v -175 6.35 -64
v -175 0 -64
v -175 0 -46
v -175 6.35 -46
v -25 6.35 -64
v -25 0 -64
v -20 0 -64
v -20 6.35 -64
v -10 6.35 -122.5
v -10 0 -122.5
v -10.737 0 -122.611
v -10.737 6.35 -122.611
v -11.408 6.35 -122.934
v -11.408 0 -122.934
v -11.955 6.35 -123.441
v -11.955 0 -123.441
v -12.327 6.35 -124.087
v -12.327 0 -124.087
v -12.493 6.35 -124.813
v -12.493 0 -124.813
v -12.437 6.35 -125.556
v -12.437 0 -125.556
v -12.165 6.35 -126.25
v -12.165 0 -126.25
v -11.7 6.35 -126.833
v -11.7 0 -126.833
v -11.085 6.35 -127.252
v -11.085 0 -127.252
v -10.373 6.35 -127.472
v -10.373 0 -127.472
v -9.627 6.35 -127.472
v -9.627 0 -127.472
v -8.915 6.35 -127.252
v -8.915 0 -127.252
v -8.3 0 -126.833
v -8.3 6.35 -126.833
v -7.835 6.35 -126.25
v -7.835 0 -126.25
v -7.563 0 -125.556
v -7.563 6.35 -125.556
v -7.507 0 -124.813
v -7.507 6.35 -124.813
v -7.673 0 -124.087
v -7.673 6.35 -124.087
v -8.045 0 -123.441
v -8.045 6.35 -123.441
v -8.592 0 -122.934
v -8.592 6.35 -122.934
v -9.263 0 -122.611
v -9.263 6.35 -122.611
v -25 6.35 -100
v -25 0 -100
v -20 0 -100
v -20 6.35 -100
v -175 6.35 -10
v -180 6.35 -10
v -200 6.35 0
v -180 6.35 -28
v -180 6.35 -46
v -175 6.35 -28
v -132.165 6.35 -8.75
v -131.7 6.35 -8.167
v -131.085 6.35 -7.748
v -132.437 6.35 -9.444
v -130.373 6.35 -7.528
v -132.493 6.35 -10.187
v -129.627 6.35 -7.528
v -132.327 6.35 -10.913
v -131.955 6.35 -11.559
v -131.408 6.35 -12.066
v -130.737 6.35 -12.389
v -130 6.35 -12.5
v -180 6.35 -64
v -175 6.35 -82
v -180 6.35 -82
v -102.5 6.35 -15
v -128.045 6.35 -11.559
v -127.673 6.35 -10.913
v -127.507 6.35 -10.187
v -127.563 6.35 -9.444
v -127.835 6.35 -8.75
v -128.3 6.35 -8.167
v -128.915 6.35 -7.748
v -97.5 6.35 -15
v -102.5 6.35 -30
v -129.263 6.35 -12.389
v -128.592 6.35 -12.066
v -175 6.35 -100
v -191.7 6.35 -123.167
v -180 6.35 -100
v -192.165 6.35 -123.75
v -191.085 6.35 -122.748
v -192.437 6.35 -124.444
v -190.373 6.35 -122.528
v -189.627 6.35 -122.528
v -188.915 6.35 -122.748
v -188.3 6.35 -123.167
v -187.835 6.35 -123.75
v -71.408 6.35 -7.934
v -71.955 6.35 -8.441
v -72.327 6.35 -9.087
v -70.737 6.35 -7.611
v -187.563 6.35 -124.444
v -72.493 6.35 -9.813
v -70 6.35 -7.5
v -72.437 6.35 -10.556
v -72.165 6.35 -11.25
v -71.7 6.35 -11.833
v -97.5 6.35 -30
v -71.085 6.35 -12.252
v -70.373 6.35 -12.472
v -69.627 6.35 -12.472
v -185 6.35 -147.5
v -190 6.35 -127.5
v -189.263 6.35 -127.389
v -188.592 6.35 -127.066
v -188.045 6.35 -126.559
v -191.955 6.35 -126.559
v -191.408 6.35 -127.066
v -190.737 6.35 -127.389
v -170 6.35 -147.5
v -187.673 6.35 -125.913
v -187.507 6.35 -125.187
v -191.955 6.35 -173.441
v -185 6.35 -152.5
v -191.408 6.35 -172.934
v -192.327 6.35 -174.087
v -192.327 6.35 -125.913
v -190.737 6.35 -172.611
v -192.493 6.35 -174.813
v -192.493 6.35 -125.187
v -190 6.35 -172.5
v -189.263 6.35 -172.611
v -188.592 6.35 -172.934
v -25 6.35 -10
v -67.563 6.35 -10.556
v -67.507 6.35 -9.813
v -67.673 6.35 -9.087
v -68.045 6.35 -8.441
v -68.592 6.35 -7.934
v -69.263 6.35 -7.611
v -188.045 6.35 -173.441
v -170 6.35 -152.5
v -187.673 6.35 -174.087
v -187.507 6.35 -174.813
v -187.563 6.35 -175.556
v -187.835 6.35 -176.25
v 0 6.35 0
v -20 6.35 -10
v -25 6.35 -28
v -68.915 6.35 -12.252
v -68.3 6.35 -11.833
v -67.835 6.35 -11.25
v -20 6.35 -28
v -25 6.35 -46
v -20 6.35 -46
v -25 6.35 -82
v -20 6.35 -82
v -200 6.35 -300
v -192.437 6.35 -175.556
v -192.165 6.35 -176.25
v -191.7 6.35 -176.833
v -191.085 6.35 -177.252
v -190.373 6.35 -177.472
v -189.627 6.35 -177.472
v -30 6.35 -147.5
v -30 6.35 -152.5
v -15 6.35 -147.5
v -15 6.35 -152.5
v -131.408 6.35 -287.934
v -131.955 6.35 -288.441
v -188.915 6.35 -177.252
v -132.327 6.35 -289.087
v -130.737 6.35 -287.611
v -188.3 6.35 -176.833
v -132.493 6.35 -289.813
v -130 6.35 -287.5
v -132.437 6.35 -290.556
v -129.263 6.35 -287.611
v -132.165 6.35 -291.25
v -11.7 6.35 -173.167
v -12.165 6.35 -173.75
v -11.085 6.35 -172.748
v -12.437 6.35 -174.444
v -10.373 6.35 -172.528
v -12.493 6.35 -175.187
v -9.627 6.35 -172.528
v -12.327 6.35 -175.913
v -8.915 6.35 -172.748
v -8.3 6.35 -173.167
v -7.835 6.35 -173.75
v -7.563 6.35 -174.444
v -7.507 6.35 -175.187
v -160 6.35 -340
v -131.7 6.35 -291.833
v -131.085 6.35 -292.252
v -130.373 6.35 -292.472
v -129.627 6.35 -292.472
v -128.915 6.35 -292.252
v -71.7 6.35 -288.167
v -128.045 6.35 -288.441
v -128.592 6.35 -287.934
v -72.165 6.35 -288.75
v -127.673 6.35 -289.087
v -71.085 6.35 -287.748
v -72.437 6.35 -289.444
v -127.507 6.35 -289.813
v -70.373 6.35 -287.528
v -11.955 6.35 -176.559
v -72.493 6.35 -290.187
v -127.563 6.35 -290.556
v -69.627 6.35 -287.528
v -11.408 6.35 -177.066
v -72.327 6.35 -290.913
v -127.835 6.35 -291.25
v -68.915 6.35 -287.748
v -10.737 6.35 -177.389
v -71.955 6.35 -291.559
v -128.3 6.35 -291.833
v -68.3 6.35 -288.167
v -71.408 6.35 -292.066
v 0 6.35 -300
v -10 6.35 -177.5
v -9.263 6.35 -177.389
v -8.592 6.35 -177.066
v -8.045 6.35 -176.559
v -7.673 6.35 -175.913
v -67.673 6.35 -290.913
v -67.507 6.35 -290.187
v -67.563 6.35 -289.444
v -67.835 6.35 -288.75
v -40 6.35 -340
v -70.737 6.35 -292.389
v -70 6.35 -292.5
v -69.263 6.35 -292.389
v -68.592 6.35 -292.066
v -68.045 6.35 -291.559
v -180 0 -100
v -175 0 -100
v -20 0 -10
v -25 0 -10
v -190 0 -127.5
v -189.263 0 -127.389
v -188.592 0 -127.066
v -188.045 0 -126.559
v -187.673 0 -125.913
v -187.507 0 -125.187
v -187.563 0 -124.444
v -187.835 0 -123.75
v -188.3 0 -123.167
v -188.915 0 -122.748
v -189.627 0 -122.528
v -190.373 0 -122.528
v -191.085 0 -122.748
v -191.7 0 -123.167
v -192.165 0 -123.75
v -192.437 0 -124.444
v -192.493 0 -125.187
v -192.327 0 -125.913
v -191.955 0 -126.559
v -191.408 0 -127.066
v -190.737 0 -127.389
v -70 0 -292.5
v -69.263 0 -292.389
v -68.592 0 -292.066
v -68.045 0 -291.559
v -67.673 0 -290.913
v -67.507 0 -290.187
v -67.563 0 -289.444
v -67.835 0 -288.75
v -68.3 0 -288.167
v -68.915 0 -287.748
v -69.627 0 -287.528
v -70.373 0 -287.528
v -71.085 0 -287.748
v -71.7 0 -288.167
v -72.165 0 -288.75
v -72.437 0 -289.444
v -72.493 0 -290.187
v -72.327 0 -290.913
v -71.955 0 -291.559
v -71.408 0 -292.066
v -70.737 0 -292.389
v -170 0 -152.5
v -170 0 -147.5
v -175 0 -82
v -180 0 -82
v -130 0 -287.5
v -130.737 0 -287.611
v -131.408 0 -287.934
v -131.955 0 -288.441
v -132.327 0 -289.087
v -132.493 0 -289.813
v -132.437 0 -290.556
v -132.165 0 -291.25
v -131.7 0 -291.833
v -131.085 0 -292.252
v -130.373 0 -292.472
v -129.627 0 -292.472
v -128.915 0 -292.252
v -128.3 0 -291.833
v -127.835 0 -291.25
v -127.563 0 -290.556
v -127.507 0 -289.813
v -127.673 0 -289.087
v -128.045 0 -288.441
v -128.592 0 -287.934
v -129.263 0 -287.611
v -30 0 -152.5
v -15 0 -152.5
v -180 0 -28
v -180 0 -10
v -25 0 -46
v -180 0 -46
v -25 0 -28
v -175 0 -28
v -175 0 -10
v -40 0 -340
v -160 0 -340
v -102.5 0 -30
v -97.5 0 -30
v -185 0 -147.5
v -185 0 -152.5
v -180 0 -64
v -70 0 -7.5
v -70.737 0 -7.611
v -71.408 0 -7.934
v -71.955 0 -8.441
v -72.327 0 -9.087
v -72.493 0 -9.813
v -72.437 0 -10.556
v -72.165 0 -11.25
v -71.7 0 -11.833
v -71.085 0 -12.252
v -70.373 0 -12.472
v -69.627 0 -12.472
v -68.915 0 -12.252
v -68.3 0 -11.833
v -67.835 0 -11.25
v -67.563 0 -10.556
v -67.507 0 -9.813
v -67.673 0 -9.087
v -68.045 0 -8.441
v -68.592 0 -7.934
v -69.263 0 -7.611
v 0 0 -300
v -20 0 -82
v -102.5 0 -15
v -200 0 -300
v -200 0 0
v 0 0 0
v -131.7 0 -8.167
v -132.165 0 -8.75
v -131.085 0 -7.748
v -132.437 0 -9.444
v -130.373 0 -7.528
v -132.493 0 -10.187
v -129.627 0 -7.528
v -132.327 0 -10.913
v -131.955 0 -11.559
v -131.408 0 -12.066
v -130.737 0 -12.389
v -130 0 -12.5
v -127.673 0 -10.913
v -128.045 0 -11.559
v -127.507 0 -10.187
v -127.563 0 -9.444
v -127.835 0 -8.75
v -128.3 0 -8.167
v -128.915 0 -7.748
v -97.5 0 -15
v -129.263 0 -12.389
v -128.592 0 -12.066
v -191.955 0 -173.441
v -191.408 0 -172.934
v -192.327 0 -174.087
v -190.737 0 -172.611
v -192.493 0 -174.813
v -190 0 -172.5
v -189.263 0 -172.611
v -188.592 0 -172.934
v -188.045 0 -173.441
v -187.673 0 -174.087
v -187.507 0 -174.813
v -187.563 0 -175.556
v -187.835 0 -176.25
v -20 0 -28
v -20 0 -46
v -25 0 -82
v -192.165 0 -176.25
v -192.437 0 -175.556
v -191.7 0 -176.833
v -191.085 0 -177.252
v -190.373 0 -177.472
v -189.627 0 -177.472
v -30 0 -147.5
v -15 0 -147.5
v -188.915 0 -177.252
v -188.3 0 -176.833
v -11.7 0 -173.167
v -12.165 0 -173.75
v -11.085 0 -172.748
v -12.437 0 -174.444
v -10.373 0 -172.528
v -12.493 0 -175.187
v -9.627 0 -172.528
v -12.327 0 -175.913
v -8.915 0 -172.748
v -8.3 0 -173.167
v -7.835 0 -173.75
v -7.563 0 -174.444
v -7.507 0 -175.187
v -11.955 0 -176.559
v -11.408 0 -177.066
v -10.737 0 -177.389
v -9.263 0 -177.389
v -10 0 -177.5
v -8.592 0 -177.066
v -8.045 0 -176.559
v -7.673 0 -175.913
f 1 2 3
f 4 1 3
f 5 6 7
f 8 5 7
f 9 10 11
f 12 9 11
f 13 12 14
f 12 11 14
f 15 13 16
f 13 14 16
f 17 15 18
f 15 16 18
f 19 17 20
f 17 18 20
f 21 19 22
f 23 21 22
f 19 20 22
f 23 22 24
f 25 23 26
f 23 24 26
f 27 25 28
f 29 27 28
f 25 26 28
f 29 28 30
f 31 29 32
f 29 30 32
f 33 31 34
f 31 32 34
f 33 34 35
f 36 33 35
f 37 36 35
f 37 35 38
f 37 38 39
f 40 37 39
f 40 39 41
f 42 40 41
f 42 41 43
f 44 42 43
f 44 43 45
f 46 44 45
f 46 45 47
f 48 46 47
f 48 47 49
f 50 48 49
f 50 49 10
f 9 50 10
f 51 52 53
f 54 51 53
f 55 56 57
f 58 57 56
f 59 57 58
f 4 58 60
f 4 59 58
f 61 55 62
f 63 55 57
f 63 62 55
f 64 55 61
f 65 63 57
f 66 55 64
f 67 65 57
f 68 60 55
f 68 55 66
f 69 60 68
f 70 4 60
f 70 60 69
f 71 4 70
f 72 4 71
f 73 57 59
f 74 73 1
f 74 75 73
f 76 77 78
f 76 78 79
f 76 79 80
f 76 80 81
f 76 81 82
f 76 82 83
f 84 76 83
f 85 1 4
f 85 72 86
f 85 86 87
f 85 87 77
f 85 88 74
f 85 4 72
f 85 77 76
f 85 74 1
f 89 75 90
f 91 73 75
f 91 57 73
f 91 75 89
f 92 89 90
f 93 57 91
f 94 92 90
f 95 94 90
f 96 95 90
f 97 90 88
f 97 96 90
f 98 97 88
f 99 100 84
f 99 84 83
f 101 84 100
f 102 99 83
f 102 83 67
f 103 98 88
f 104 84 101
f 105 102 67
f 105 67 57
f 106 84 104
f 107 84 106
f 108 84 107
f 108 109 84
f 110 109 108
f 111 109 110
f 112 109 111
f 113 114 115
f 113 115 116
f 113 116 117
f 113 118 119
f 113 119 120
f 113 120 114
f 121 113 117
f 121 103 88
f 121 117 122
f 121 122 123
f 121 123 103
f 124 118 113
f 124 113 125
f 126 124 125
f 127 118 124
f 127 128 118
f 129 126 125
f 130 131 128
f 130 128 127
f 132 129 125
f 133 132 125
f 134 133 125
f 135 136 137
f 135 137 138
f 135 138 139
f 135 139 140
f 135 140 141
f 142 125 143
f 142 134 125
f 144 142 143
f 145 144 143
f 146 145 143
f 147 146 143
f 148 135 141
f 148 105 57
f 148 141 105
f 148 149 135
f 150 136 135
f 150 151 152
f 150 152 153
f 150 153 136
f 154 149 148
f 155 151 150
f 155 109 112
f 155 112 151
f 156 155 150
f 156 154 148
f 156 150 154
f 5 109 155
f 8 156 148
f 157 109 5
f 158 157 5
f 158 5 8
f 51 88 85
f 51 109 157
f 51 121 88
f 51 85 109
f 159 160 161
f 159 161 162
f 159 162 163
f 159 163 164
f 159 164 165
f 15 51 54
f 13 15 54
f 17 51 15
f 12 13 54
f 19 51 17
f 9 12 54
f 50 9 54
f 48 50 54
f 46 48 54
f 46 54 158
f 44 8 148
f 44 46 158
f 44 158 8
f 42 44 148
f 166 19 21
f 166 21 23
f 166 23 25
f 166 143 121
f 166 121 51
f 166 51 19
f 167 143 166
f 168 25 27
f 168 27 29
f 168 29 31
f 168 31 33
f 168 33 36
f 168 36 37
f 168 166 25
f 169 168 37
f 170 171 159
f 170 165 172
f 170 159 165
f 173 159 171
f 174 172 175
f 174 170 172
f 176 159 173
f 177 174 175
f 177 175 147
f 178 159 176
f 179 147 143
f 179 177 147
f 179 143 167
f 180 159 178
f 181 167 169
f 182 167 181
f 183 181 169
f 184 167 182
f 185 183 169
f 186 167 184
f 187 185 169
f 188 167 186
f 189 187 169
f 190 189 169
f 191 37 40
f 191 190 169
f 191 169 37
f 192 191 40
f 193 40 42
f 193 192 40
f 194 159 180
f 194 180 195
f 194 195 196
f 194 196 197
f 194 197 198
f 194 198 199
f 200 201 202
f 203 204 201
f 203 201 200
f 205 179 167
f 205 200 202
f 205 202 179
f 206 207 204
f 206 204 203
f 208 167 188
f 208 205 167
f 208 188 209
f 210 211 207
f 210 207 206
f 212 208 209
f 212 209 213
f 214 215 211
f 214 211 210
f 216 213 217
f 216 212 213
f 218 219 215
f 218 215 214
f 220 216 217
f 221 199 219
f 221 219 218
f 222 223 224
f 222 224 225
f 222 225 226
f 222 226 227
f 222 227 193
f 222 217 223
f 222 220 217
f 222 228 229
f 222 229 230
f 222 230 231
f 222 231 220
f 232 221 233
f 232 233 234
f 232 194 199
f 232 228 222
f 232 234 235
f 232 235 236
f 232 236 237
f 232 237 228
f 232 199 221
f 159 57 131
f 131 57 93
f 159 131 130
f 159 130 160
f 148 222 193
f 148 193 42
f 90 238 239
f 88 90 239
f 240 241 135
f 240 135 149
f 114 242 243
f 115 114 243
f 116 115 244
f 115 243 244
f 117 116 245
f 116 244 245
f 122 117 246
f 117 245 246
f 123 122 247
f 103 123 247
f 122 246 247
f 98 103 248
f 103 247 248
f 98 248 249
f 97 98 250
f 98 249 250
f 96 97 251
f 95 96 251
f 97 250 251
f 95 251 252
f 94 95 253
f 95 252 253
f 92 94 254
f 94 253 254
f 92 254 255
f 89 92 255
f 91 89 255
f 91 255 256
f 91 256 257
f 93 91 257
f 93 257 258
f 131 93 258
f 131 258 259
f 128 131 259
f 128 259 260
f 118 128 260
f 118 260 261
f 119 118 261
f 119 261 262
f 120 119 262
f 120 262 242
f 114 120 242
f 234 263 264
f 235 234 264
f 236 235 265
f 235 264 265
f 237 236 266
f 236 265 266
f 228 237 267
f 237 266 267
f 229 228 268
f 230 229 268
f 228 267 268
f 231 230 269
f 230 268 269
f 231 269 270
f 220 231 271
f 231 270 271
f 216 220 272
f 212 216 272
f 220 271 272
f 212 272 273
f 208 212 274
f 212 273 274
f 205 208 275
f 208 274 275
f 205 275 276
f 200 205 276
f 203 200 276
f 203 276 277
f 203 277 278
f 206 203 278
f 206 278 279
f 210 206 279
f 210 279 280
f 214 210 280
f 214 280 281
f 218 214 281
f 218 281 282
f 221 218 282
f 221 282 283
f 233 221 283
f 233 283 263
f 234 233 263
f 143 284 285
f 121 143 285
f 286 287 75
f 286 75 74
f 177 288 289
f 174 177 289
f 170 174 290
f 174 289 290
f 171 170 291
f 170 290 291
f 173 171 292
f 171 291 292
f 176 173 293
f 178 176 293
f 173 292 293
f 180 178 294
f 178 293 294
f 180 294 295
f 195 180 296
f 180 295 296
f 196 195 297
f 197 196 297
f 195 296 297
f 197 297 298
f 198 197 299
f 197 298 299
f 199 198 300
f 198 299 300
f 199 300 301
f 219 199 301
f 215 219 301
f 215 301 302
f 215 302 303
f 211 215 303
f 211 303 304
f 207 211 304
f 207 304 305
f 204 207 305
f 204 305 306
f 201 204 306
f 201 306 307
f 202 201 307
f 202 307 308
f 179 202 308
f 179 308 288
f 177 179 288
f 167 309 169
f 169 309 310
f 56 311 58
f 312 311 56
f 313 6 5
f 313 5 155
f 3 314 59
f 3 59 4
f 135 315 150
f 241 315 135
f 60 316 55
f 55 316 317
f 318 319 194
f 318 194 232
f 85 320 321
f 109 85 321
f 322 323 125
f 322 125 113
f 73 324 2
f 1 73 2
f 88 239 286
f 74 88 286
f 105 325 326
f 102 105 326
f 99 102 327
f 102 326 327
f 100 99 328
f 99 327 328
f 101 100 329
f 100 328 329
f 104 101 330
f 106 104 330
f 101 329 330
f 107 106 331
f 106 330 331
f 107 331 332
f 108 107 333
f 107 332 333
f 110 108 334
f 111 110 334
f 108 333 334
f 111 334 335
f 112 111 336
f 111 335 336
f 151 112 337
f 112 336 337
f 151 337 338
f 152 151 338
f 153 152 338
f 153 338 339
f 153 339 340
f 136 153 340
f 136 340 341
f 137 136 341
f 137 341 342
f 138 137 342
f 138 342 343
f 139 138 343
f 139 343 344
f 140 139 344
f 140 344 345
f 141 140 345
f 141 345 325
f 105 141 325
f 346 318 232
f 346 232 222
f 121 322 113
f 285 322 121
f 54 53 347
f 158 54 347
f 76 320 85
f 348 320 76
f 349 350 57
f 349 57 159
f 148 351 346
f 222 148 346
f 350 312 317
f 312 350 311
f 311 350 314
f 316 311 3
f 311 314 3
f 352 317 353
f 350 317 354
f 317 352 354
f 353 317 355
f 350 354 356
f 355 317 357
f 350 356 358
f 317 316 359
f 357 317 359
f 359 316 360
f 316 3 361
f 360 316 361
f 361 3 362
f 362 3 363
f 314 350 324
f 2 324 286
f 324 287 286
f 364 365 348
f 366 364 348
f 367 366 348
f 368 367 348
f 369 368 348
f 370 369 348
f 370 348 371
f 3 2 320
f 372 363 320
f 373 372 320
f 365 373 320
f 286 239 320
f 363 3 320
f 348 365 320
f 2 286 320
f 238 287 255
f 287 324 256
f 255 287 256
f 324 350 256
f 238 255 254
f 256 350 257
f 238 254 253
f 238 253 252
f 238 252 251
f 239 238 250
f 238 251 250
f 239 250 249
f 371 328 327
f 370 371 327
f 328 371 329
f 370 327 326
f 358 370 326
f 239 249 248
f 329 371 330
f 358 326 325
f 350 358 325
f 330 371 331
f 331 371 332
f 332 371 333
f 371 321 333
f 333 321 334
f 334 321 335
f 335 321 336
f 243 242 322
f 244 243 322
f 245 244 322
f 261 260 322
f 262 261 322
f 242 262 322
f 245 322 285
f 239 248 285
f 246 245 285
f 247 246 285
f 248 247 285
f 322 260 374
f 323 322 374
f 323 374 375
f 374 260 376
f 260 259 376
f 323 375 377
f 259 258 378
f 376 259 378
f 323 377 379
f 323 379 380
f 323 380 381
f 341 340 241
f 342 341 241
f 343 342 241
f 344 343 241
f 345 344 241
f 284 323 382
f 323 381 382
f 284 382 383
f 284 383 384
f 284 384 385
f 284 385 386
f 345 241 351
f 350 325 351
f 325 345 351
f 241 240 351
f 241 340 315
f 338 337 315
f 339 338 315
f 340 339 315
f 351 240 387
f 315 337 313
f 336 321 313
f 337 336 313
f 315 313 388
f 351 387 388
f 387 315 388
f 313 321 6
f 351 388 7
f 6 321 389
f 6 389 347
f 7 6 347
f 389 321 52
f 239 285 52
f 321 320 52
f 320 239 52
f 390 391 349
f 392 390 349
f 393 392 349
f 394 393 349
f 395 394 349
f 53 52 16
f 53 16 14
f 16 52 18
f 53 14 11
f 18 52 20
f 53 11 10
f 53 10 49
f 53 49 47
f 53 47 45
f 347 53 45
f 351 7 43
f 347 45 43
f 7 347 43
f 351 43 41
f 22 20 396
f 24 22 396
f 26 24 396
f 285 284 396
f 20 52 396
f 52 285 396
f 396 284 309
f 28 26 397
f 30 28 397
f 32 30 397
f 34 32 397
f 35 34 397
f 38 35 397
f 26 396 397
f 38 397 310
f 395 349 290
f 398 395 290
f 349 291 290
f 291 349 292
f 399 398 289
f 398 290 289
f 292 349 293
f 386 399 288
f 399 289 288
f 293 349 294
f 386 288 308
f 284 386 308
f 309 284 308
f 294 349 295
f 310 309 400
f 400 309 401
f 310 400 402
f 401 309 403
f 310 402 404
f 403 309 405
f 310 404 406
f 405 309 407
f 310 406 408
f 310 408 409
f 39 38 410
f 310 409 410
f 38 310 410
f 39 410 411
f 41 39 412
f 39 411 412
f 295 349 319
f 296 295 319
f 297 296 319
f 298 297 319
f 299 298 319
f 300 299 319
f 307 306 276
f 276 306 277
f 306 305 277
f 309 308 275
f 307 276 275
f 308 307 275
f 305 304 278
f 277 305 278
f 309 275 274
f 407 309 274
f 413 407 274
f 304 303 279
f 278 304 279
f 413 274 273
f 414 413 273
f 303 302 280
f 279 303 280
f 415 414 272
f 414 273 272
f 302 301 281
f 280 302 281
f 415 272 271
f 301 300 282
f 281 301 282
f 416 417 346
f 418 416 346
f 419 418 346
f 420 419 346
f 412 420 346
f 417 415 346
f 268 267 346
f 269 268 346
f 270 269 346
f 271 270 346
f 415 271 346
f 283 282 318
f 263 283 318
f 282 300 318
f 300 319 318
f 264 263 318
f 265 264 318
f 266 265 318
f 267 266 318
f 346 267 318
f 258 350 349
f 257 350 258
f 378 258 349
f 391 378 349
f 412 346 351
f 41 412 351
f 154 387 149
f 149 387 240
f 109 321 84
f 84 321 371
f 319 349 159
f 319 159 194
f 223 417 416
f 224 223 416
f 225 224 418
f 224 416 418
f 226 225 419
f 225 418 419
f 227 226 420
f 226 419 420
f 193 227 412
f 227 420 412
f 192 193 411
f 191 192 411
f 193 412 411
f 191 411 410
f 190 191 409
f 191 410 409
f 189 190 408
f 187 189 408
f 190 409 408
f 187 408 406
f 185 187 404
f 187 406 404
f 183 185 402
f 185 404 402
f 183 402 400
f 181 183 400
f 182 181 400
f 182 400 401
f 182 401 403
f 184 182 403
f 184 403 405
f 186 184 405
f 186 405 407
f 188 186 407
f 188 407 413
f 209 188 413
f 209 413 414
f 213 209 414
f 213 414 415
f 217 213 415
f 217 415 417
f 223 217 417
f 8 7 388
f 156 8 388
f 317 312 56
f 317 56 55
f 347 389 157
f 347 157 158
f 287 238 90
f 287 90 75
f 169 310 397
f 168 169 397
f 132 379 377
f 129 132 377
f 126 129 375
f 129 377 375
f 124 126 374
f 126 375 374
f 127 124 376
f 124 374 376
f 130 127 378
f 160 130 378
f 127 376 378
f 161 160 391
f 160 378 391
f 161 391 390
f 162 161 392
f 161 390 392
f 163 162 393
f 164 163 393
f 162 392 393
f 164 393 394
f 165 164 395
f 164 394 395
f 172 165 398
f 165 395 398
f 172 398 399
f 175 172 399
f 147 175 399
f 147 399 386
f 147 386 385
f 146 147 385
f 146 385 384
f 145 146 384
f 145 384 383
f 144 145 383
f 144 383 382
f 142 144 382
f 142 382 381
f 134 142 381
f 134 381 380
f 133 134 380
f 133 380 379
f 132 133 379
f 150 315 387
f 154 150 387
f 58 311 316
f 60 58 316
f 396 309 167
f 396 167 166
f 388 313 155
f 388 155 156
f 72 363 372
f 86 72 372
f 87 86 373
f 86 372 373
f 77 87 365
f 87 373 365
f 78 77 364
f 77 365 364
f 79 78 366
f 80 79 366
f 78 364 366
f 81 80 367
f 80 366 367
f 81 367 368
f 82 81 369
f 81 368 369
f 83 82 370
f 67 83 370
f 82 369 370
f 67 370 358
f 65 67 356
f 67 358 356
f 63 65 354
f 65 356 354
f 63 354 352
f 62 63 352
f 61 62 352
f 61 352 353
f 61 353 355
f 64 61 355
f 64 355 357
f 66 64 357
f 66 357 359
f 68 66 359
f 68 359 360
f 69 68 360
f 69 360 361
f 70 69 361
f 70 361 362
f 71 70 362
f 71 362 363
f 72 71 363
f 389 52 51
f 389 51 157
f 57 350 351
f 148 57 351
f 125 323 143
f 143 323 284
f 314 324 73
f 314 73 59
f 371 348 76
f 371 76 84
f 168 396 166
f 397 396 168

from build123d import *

# Parameters (mm, degrees)
BOSS_EXTRUDE1_DEPTH = 6.35
SKETCH2_R           = 2.5
SKETCH2_W           = 5
SKETCH2_H           = 15
SKETCH2_W_2         = 15
SKETCH2_H_2         = 5
CUT_EXTRUDE1_DEPTH  = 10
SKETCH3_W           = 5
SKETCH3_H           = 18
CUT_EXTRUDE2_DEPTH  = 10


with BuildPart() as part:
    # Sketch1 → Boss-Extrude1 (new body)
    with BuildSketch(Plane(origin=(0, 0, 0), x_dir=(1, 0, 0), z_dir=(0, 1, 0))):
        Polygon((-160, 340), (-200, 300), (-200, 0), (0, 0), (0, 300), (-40, 340), align=None)
    extrude(amount=BOSS_EXTRUDE1_DEPTH)

    # Sketch2 → Cut-Extrude1 (cut)
    with BuildSketch(Plane.XZ):
        with Locations((-190, -125)):
            Circle(SKETCH2_R)
        with Locations((-130, -10)):
            Circle(SKETCH2_R)
        with Locations((-70, -10)):
            Circle(SKETCH2_R)
        with Locations((-10, -125)):
            Circle(SKETCH2_R)
        with Locations((-70, -290)):
            Circle(SKETCH2_R)
        with Locations((-10, -175)):
            Circle(SKETCH2_R)
        with Locations((-130, -290)):
            Circle(SKETCH2_R)
        with Locations((-190, -175)):
            Circle(SKETCH2_R)
        with Locations((-100, -22.5)):
            Rectangle(SKETCH2_W, SKETCH2_H)
        with Locations((-177.5, -150)):
            Rectangle(SKETCH2_W_2, SKETCH2_H_2)
        with Locations((-22.5, -150)):
            Rectangle(SKETCH2_W_2, SKETCH2_H_2)
    extrude(amount=-CUT_EXTRUDE1_DEPTH, mode=Mode.SUBTRACT)

    # Sketch3 → Cut-Extrude2 (cut)
    with BuildSketch(Plane.XZ):
        with Locations((-177.5, -19)):
            Rectangle(SKETCH3_W, SKETCH3_H)
        with Locations((-177.5, -55)):
            Rectangle(SKETCH3_W, SKETCH3_H)
        with Locations((-177.5, -91)):
            Rectangle(SKETCH3_W, SKETCH3_H)
        with Locations((-22.5, -19)):
            Rectangle(SKETCH3_W, SKETCH3_H)
        with Locations((-22.5, -55)):
            Rectangle(SKETCH3_W, SKETCH3_H)
        with Locations((-22.5, -91)):
            Rectangle(SKETCH3_W, SKETCH3_H)
    extrude(amount=-CUT_EXTRUDE2_DEPTH, mode=Mode.SUBTRACT)


solid = part.part
